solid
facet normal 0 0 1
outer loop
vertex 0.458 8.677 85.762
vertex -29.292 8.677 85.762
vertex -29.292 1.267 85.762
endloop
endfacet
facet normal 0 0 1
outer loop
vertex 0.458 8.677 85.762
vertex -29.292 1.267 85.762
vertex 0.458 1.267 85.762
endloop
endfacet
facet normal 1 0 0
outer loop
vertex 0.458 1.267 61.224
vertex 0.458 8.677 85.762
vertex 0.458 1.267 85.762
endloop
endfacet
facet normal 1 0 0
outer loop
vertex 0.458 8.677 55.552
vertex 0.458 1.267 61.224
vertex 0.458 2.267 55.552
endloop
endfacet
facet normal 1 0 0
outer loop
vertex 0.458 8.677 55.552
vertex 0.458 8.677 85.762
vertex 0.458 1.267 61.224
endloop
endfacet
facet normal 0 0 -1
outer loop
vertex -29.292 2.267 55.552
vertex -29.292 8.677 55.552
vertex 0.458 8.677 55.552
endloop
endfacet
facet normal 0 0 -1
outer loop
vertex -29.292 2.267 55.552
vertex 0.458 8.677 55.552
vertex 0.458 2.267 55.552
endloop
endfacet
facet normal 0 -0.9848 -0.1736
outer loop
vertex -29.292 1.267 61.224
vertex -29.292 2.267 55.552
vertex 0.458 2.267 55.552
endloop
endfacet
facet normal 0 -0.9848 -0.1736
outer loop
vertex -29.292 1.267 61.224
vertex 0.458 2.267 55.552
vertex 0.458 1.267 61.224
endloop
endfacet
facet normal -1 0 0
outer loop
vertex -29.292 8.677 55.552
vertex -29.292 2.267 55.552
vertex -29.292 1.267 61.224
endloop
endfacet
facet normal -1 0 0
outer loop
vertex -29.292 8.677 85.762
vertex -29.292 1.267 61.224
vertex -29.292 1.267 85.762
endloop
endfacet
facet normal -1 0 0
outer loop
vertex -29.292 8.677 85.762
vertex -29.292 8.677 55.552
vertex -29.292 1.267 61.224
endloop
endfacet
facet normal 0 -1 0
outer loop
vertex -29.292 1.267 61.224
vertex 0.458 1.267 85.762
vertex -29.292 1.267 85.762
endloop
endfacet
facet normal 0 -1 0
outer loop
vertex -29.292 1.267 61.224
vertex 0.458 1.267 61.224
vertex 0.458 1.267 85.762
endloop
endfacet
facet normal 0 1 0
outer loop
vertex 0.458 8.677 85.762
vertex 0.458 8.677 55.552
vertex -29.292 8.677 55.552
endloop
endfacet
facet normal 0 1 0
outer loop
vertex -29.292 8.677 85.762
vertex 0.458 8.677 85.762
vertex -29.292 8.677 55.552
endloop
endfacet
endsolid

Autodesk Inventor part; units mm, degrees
ref_plane "Work Plane1" through (43.5156, 8.6766, 49.2201) normal (0, -1, 0) x (-1, 0, 0)
sketch "Sketch1" plane through (43.5156, 8.6766, 49.2201) normal (0, -1, 0) x (-1, 0, 0)
  line L0 (43.0578, -4.3321) -> (72.8078, -4.3321)
  line L1 (72.8078, -4.3321) -> (72.8078, -36.5421)
  line L2 (72.8078, -36.5421) -> (43.0578, -36.5421)
  line L3 (43.0578, -36.5421) -> (43.0578, -4.3321)
  dimension "d0" = 29.75
  dimension "d1" = 32.21
extrude "Extrusion1" add sketch "Sketch1" along normal blind 7.41
ref_plane "Work Plane2" through (-14.4171, 8.6766, 85.7622) normal (1, 0, 0) x (0, 0, -1)
ref_plane "Work Plane3" through (-29.2921, 1.2666, 53.5522) normal (0, -0.7071, -0.7071) x (1, 0, 0)
sketch "Sketch2" plane through (0.4579, 8.6766, 85.7622) normal (1, 0, 0) x (0, 0, -1)
  line L0 (32.21, 0) -> (30.21, 0)
  line L1 (30.21, 0) -> (30.21, -6.41)
  line L2 (30.21, -7.41) -> (32.21, -7.41)
  line L3 (32.21, -7.41) -> (32.21, 0)
  line L4 (30.21, -6.41) -> (24.5387, -7.41)
  line L5 (24.5387, -7.41) -> (30.21, -7.41)
extrude "Extrusion2" cut sketch "Sketch2" against normal through all
properties part number "Battery"
